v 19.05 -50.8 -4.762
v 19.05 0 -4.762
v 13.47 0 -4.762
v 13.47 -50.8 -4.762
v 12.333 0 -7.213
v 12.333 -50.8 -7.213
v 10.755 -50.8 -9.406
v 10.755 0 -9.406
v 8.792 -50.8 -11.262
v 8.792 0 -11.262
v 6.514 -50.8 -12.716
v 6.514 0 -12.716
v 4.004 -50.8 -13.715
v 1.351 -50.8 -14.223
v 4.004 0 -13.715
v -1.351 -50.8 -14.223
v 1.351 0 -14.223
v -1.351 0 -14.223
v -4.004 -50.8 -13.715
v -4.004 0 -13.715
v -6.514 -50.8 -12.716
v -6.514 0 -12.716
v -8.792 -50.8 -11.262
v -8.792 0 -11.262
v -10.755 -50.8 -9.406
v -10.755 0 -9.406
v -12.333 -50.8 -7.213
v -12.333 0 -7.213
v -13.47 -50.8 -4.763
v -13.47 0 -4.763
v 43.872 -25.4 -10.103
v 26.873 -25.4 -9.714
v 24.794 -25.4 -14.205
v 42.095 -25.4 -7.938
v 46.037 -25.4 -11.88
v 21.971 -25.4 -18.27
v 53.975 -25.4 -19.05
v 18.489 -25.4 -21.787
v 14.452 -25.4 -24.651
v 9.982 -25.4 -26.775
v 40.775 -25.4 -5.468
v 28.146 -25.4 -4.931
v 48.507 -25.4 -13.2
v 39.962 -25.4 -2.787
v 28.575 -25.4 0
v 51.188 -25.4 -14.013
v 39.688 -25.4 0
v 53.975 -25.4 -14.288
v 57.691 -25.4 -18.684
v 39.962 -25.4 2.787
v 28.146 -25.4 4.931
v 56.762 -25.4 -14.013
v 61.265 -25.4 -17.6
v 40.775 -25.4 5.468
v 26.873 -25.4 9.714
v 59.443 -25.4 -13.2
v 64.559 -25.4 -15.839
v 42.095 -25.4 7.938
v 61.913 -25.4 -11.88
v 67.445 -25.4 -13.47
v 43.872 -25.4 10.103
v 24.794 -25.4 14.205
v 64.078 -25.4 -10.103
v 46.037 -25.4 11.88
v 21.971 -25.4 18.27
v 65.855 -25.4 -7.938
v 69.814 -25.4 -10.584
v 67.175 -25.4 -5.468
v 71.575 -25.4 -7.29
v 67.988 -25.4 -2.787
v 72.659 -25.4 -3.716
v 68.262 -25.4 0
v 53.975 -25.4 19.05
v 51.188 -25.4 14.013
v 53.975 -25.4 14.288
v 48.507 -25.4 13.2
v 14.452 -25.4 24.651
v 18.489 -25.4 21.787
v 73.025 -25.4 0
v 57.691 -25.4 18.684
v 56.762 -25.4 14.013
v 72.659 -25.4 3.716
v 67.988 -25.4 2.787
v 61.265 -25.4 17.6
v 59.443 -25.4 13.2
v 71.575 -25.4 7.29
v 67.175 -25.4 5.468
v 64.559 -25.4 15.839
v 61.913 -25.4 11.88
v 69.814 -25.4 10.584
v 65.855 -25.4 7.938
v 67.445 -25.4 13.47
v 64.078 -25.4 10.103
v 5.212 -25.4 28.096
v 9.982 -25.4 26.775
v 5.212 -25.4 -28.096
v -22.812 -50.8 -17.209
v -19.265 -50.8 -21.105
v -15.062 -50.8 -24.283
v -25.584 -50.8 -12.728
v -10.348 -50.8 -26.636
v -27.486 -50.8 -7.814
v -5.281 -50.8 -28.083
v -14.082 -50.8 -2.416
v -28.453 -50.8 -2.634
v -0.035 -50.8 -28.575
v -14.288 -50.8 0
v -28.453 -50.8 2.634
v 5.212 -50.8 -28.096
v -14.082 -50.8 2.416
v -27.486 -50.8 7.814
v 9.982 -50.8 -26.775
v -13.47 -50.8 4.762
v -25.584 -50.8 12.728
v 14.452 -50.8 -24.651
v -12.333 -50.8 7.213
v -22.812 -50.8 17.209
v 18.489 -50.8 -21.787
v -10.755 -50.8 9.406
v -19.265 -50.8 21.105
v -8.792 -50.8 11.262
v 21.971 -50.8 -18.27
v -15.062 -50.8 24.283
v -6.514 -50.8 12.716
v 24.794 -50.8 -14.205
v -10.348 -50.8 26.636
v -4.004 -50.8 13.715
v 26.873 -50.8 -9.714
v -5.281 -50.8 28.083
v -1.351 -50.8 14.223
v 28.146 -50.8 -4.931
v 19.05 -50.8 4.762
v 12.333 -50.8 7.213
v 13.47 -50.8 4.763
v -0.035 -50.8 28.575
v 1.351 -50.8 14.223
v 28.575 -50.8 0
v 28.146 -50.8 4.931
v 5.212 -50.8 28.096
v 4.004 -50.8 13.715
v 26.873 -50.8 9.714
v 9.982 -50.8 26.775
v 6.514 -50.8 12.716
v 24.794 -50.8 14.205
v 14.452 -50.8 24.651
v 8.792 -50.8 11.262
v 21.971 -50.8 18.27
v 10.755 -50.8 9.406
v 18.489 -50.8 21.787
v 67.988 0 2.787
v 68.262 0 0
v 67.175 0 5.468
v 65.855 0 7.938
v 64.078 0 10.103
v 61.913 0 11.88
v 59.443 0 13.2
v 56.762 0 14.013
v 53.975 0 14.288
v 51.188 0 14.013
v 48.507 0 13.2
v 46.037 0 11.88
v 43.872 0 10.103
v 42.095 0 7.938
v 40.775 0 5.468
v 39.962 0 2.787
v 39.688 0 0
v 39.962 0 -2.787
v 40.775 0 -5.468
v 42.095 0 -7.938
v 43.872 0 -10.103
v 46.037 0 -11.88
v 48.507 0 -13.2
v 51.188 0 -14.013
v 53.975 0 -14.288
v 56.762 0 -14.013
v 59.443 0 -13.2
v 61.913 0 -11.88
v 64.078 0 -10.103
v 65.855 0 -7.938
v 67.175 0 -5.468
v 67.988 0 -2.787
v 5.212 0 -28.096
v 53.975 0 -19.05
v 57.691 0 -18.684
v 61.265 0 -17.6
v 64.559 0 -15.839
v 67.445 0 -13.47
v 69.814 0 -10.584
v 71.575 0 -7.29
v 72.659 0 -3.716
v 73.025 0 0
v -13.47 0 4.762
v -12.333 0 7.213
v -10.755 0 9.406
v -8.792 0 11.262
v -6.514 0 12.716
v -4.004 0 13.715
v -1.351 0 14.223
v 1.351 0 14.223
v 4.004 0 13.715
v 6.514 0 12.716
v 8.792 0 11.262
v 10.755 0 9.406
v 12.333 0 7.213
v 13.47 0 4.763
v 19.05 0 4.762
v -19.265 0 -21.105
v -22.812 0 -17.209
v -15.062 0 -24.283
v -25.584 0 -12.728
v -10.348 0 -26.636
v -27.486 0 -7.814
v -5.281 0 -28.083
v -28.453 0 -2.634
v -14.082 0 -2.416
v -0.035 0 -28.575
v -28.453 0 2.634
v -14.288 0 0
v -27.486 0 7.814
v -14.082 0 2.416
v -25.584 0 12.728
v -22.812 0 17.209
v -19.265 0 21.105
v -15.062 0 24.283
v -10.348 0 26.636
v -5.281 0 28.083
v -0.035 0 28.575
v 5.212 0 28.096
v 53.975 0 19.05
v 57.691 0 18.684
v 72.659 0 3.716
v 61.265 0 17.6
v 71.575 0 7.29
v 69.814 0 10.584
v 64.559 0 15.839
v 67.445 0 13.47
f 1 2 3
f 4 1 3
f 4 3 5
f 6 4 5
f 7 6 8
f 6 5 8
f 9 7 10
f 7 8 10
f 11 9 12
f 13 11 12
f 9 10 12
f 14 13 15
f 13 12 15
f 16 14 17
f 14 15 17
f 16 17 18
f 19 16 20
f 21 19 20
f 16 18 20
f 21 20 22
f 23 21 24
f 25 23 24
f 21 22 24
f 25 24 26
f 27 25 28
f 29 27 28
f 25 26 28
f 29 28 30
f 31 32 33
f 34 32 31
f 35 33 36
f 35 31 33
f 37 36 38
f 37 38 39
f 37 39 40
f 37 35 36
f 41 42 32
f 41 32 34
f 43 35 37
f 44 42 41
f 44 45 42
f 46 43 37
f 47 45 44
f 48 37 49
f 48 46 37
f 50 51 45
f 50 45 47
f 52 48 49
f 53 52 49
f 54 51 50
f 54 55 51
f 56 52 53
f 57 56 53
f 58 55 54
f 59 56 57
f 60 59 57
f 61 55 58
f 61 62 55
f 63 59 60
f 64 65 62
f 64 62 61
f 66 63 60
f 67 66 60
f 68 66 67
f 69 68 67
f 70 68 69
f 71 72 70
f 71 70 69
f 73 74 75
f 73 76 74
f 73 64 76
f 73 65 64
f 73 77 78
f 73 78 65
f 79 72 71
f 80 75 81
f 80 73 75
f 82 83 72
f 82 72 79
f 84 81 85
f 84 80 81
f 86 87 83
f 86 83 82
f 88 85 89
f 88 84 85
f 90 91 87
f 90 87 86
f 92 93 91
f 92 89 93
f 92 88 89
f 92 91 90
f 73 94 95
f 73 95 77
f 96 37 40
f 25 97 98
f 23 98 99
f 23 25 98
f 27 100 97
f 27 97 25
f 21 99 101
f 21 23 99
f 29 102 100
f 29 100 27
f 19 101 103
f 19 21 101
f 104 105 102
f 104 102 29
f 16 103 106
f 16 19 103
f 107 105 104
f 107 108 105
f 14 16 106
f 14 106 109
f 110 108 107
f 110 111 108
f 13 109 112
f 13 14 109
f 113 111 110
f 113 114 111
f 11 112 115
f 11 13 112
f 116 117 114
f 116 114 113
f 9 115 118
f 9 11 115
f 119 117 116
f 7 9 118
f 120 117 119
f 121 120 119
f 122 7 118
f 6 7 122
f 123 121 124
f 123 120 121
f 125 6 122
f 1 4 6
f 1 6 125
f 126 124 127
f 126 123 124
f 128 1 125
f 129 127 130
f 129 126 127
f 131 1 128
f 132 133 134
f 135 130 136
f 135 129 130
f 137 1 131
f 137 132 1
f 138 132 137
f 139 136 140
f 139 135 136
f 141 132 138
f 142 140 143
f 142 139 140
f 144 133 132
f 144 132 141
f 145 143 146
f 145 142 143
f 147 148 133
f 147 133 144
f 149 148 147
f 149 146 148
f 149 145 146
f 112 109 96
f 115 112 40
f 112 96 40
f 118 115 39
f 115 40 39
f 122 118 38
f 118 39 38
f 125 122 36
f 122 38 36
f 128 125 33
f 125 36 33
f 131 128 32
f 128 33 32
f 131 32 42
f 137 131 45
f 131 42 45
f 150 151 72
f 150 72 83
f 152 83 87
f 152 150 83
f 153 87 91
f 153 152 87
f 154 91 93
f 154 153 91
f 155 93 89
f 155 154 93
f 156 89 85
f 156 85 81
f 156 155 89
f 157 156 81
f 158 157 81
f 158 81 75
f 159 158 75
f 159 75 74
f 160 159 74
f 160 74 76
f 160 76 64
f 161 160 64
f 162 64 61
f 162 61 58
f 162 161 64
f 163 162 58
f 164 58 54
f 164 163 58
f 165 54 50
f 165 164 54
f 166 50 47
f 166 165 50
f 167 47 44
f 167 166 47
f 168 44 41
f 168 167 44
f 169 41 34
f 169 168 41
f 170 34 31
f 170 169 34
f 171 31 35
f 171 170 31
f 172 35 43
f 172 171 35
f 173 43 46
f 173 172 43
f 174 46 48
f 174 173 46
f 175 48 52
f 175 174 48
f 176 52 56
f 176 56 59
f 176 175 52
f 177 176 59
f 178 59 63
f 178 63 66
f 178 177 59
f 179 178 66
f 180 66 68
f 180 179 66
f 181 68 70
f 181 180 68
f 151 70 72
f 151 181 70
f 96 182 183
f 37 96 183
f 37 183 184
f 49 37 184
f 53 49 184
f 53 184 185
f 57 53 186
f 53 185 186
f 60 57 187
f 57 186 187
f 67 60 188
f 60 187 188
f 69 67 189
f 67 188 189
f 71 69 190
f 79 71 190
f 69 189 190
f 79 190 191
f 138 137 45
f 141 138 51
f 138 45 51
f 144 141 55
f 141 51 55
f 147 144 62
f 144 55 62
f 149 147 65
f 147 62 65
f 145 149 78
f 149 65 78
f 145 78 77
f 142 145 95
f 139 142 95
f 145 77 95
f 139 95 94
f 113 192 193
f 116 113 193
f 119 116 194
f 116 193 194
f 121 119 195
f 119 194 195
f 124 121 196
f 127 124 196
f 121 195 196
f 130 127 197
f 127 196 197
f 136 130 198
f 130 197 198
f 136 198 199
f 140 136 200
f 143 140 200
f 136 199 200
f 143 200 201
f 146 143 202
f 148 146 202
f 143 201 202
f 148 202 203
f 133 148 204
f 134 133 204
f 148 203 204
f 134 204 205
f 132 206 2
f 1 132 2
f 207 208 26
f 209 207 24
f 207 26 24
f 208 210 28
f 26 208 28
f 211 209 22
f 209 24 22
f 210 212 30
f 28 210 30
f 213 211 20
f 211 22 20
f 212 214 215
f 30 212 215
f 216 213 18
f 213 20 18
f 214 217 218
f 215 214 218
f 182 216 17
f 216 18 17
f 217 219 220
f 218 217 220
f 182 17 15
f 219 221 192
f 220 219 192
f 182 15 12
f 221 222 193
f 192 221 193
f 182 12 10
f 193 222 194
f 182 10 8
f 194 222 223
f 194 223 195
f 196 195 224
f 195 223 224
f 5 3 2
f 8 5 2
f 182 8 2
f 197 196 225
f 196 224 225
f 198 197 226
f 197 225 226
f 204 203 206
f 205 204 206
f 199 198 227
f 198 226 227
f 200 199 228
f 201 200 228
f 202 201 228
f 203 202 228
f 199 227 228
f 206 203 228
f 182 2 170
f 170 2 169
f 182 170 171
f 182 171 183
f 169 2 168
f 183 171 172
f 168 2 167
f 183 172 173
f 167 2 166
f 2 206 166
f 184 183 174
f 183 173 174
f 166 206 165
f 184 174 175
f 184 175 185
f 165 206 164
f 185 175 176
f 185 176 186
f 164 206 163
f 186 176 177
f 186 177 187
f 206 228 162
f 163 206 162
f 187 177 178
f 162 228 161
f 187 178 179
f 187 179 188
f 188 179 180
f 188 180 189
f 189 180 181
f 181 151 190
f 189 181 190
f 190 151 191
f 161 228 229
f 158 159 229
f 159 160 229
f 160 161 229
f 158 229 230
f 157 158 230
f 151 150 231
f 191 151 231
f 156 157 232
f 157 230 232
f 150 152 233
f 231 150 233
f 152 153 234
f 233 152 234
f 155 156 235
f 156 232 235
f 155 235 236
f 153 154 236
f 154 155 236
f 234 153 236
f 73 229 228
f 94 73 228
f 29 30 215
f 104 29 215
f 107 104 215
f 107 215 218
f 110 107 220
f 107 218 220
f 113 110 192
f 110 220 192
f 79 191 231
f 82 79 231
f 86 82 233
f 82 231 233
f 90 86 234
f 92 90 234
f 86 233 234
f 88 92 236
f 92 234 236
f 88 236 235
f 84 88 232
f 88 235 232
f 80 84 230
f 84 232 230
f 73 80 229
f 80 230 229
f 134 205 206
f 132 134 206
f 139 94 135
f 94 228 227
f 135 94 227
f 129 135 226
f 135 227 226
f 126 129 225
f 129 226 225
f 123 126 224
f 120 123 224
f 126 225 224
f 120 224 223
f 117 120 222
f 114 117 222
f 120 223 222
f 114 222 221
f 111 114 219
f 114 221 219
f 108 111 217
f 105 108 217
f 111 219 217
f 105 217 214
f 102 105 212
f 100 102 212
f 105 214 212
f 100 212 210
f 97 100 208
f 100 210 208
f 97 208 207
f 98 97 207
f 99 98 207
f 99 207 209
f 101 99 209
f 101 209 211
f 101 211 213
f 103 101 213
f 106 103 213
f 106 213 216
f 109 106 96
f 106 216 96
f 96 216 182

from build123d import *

# Parameters (mm, degrees)
F0_R     = 14.2875
F1_DEPTH = 25.4
F2_DEPTH = 50.8
F3_DEPTH = 50.8


with BuildPart() as f1:
    # F0 (on Front) → F1 (new body)
    with BuildSketch(Plane.XZ):
        with BuildLine():
            ThreePointArc((5.211817, -28.095686), (21.971098, -18.270235), (28.575, 0))
            ThreePointArc((28.575, 0), (21.971098, 18.270235), (5.211817, 28.095686))
            ThreePointArc((5.211817, 28.095686), (-28.575, 0), (5.211817, -28.095686))
        make_face()
        with BuildLine():
            ThreePointArc((-13.470384, 4.7625), (0, 14.2875), (13.470384, 4.7625))
            Line((13.470384, 4.7625), (19.05, 4.7625))
            Line((19.05, 4.7625), (19.05, -4.7625))
            Line((19.05, -4.7625), (13.470384, -4.7625))
            ThreePointArc((13.470384, -4.7625), (0, -14.2875), (-13.470384, -4.7625))
            Line((-13.470384, -4.7625), (-19.05, -4.7625))
            Line((-19.05, -4.7625), (-19.05, 4.7625))
            Line((-19.05, 4.7625), (-13.470384, 4.7625))
        make_face(mode=Mode.SUBTRACT)
        with BuildLine():
            ThreePointArc((5.211817, 28.095686), (21.971098, 18.270235), (28.575, 0))
            ThreePointArc((28.575, 0), (21.971098, -18.270235), (5.211817, -28.095686))
            Line((5.211817, -28.095686), (53.975, -19.05))
            ThreePointArc((53.975, -19.05), (34.925, 0), (53.975, 19.05))
            Line((53.975, 19.05), (5.211817, 28.095686))
        make_face()
        with BuildLine():
            ThreePointArc((73.025, 0), (67.445384, 13.470384), (53.975, 19.05))
            ThreePointArc((53.975, 19.05), (34.925, 0), (53.975, -19.05))
            ThreePointArc((53.975, -19.05), (67.445384, -13.470384), (73.025, 0))
        make_face()
        with Locations((53.975, 0)):
            Circle(F0_R, mode=Mode.SUBTRACT)
    extrude(amount=F1_DEPTH)

    # F0 (on Front) → F2 (join)
    with BuildSketch(Plane.XZ):
        with BuildLine():
            ThreePointArc((5.211817, -28.095686), (21.971098, -18.270235), (28.575, 0))
            ThreePointArc((28.575, 0), (21.971098, 18.270235), (5.211817, 28.095686))
            ThreePointArc((5.211817, 28.095686), (-28.575, 0), (5.211817, -28.095686))
        make_face()
        with BuildLine():
            ThreePointArc((-13.470384, 4.7625), (0, 14.2875), (13.470384, 4.7625))
            Line((13.470384, 4.7625), (19.05, 4.7625))
            Line((19.05, 4.7625), (19.05, -4.7625))
            Line((19.05, -4.7625), (13.470384, -4.7625))
            ThreePointArc((13.470384, -4.7625), (0, -14.2875), (-13.470384, -4.7625))
            Line((-13.470384, -4.7625), (-19.05, -4.7625))
            Line((-19.05, -4.7625), (-19.05, 4.7625))
            Line((-19.05, 4.7625), (-13.470384, 4.7625))
        make_face(mode=Mode.SUBTRACT)
    extrude(amount=F2_DEPTH)

    # F0 (on Front) → F3 (join)
    with BuildSketch(Plane.XZ):
        with BuildLine():
            ThreePointArc((-13.470384, -4.7625), (-14.2875, 0), (-13.470384, 4.7625))
            Line((-13.470384, 4.7625), (-19.05, 4.7625))
            Line((-19.05, 4.7625), (-19.05, -4.7625))
            Line((-19.05, -4.7625), (-13.470384, -4.7625))
        make_face()
    extrude(amount=F3_DEPTH)


solid = f1.part
